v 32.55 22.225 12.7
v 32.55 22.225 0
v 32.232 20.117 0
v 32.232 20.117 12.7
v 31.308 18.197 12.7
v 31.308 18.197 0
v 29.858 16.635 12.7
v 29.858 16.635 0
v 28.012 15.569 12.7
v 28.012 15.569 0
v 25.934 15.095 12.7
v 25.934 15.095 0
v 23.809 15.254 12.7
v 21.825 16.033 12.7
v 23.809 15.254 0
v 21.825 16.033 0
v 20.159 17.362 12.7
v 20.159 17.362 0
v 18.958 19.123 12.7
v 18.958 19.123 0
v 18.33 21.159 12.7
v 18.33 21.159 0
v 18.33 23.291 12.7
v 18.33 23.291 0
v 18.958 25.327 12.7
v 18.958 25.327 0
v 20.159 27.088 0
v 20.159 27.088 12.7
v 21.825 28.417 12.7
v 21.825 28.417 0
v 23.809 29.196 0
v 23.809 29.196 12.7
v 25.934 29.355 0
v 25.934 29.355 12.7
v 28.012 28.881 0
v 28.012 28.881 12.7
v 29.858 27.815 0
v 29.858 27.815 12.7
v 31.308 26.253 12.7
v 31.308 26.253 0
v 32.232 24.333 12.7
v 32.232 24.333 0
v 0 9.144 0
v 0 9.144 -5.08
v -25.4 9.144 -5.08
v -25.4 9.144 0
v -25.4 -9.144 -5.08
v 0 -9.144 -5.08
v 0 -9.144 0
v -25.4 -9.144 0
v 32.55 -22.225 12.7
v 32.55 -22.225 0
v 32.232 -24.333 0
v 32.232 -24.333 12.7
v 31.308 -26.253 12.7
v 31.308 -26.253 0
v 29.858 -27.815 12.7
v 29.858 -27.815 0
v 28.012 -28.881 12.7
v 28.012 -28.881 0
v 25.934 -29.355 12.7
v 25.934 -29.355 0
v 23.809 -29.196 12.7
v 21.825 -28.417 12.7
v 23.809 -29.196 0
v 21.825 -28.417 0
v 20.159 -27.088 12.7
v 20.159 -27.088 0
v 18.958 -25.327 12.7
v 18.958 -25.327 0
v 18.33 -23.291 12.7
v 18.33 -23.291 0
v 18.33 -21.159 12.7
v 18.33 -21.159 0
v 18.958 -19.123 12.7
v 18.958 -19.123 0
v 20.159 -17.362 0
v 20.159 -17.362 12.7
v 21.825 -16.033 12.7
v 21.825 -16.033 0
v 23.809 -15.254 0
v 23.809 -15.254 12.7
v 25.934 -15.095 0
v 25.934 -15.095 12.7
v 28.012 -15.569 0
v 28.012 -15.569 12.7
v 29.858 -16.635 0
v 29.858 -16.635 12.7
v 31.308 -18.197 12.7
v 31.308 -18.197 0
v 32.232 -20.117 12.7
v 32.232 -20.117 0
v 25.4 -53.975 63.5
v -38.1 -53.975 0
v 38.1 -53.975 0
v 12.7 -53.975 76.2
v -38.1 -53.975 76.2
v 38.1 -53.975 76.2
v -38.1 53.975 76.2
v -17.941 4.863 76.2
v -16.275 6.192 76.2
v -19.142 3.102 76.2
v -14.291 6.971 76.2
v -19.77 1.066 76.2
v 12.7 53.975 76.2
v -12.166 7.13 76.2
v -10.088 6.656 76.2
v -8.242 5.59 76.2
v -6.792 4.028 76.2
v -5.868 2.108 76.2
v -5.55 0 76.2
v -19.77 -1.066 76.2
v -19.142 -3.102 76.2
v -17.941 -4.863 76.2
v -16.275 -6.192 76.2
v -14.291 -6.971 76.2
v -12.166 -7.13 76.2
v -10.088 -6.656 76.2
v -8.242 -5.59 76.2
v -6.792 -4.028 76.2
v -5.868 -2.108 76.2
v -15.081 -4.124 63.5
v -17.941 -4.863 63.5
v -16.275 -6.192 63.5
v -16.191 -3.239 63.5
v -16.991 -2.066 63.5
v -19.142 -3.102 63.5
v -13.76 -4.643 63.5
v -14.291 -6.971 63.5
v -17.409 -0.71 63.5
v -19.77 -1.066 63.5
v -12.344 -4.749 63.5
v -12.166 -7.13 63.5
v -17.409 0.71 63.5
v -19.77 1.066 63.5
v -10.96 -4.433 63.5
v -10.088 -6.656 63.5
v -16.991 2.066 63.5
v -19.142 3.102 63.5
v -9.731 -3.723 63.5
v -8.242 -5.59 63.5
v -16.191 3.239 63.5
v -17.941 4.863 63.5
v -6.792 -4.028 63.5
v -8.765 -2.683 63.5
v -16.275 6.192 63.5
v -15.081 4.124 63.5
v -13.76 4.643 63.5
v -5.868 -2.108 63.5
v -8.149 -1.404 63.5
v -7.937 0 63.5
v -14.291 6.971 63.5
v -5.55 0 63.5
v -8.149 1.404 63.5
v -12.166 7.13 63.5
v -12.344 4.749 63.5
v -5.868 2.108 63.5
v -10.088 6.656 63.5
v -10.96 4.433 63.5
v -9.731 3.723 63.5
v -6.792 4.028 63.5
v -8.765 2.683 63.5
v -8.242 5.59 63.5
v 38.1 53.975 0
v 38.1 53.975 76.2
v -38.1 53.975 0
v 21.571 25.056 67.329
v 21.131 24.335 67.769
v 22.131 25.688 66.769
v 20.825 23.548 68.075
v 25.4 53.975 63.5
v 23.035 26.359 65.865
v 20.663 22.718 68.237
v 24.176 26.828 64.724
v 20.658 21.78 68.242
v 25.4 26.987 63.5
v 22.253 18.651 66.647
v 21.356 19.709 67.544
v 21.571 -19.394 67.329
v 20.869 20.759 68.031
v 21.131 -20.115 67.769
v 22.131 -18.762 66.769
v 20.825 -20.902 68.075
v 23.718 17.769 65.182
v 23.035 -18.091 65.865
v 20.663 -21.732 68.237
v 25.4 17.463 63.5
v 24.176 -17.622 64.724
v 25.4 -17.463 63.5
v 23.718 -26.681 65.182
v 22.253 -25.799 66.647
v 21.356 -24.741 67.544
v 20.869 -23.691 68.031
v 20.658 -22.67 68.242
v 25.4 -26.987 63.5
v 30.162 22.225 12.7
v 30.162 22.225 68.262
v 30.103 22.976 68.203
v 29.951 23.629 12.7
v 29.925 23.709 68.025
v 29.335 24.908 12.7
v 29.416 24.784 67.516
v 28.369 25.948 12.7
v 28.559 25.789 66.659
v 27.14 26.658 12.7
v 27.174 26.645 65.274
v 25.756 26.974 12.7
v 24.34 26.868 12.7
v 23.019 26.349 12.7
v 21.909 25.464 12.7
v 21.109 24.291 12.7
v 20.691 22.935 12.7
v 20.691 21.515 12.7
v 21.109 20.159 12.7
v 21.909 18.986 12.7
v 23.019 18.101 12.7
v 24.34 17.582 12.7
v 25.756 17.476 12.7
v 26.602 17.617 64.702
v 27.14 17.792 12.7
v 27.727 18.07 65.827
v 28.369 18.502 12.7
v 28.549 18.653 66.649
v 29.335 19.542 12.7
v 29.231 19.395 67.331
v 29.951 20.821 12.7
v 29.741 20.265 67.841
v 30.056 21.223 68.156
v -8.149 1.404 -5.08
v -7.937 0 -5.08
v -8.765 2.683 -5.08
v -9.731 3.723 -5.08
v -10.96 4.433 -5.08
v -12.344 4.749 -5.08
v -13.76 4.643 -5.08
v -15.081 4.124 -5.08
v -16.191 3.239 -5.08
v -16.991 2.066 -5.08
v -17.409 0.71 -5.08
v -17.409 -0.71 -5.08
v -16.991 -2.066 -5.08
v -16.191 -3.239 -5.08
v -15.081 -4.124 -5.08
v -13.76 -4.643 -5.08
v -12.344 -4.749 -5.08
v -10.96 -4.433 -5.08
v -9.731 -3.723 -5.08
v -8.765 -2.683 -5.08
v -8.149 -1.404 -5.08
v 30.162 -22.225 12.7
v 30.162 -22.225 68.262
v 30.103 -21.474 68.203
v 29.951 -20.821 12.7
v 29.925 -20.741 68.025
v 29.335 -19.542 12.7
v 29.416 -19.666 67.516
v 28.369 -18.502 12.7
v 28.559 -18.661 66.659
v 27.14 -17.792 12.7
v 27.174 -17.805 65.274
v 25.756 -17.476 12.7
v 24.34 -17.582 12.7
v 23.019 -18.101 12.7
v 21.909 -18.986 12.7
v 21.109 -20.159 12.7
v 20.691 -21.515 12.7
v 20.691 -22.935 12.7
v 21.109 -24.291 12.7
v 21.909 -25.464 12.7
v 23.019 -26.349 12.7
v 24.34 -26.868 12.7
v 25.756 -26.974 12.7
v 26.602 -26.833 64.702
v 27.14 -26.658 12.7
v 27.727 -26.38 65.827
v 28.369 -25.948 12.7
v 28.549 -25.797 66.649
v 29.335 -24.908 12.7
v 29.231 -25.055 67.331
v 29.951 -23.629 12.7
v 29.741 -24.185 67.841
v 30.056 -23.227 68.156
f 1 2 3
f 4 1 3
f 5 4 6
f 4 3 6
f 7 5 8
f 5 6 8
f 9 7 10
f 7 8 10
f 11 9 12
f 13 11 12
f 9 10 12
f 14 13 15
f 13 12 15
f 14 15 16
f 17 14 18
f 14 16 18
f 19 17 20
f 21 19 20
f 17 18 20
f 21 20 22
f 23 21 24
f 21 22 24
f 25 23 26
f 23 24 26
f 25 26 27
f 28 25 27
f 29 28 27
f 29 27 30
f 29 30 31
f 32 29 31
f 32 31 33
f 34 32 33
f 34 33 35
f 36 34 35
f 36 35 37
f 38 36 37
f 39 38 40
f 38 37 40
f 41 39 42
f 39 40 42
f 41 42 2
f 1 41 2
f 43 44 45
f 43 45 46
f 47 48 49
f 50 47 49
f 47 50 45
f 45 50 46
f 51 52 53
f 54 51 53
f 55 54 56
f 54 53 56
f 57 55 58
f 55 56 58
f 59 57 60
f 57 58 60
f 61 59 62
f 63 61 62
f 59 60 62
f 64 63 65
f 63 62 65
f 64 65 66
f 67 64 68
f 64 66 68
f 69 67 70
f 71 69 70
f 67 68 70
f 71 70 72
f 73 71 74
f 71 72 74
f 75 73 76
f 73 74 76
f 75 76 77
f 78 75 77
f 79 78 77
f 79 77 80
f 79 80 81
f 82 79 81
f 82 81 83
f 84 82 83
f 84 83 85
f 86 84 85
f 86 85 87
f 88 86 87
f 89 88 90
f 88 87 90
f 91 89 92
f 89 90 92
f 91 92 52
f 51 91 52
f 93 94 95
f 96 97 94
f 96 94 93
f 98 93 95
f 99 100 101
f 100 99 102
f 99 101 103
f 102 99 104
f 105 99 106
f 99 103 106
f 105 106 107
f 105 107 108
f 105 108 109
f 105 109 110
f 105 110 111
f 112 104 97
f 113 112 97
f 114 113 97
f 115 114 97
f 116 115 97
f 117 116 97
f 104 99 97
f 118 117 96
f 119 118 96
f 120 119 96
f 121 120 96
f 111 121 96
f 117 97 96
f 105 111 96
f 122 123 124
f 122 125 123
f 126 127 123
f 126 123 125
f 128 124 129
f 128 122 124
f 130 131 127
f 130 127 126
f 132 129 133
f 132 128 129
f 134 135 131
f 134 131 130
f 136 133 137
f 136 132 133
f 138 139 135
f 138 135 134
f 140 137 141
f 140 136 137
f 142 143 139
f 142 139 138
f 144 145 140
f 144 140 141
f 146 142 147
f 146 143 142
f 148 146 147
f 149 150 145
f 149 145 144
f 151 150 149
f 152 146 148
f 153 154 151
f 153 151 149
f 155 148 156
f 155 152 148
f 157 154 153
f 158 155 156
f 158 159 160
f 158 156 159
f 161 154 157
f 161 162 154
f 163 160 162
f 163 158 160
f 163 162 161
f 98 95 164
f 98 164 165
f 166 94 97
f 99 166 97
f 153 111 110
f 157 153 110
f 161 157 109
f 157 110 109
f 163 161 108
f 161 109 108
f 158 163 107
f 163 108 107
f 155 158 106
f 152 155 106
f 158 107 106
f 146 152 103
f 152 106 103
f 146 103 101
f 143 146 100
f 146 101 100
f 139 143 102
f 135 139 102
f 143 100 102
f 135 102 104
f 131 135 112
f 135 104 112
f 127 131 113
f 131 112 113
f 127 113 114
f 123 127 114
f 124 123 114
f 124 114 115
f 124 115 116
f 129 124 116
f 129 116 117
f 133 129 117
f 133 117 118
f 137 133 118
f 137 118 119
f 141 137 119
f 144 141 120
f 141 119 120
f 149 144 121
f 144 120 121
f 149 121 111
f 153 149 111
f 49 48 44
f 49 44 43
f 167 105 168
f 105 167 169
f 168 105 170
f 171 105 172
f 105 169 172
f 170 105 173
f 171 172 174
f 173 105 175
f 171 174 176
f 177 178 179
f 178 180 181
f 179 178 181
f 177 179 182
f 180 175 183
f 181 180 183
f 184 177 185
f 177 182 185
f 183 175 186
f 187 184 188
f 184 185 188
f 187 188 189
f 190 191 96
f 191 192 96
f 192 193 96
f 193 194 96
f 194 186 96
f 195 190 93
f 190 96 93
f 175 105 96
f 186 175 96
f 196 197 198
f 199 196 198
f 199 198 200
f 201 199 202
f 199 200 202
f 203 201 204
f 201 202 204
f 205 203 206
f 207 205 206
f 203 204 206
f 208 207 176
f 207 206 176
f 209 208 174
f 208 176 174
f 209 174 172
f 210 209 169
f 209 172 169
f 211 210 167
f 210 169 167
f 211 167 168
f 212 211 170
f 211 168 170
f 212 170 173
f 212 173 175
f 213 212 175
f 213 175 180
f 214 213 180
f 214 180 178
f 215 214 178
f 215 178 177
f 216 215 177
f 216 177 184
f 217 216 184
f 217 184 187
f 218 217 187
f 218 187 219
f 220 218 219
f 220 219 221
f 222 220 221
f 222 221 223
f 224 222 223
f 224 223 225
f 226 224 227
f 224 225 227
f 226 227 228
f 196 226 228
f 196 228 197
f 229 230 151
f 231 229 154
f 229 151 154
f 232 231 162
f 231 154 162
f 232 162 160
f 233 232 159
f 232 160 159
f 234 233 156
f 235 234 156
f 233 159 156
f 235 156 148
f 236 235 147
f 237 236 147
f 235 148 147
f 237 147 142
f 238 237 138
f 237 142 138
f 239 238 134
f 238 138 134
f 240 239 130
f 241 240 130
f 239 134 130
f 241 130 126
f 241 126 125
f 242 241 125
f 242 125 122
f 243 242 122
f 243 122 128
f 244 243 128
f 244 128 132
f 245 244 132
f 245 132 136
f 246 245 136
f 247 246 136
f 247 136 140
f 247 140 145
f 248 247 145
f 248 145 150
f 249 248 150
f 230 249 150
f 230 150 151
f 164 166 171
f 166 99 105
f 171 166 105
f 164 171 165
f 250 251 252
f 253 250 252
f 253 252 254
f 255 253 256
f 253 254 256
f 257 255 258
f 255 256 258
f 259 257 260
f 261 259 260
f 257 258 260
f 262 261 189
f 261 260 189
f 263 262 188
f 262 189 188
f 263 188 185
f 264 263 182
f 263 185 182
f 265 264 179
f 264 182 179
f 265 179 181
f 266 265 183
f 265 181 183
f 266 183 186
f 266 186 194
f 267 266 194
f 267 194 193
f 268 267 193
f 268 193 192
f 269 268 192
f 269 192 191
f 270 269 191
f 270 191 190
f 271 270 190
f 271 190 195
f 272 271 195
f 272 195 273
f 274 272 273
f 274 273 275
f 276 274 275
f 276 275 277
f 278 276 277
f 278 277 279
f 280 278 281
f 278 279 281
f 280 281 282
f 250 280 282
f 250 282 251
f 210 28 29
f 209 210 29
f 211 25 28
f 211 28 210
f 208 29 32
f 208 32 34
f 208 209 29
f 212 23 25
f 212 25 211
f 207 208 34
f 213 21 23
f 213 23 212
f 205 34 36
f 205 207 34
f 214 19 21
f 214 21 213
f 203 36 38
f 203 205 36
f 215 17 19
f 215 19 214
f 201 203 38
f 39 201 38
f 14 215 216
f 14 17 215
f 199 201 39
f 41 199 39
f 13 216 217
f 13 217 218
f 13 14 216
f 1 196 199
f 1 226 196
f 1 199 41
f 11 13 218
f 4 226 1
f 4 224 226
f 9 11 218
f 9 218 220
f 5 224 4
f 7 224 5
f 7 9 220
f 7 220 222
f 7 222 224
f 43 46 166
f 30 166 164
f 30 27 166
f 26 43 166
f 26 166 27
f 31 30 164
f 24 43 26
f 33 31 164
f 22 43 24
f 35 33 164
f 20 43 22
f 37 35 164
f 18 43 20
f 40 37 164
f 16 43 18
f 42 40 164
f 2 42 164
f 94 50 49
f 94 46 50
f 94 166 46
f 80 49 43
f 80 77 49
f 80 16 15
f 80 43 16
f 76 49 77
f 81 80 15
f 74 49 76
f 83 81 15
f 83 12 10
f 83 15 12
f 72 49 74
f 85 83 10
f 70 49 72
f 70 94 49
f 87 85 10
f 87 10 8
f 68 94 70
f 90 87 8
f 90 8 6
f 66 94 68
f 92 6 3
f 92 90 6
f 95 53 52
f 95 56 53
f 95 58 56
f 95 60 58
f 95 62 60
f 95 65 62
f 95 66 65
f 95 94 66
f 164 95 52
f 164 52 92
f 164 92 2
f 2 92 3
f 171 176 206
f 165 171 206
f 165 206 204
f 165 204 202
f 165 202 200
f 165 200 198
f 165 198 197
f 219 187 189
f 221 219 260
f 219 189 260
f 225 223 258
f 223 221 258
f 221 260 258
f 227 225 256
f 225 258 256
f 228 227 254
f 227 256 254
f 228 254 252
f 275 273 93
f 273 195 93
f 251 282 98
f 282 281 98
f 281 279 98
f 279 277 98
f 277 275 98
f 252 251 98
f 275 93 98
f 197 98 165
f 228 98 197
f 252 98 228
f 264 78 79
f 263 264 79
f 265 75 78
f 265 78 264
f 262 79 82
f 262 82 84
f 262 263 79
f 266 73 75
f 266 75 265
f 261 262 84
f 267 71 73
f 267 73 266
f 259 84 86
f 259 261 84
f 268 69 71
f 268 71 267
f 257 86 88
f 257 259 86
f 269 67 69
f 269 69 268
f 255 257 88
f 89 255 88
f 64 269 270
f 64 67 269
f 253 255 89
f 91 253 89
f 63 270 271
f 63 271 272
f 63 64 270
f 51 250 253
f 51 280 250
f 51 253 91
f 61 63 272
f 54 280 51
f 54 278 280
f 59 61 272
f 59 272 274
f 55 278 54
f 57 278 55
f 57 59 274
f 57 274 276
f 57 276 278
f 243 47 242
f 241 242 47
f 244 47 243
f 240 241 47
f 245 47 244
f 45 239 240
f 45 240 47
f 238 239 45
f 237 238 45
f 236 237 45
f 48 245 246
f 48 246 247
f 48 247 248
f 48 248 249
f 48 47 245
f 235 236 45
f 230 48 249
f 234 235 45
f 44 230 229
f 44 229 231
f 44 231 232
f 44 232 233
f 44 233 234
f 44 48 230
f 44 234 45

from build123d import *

# Parameters (mm, degrees)
F0_W      = 76.2
F0_H      = 76.2
F1_DEPTH  = 53.975
F3_DEPTH  = 107.951
F5_W      = 18.288
F5_H      = 5.08
F6_DEPTH  = 63.5
F4_R      = 4.7625
F7_DEPTH  = 81.281
F8_R      = 7.1501
F9_DEPTH  = 12.7
F10_R     = 7.1501
F11_DEPTH = 12.7
F12_W     = 38.1
F12_H     = 9
F13_DEPTH = 107.951


with BuildPart() as f1:
    # F0 (on Front) → F1 (new body, symmetric)
    with BuildSketch(Plane.XZ):
        with Locations((0, 38.1)):
            Rectangle(F0_W, F0_H)
    extrude(amount=F1_DEPTH, both=True)

    # F2 (on face) → F3 (cut, through all)
    with BuildSketch(Plane.XZ.offset(53.975)):
        Polygon((38.1, 76.2), (12.7, 76.2), (25.4, 63.5), align=None)
    extrude(amount=-F3_DEPTH, mode=Mode.SUBTRACT)

    # F5 (on face) → F6 (join)
    with BuildSketch(Plane.YZ.offset(38.1)):
        with Locations((0, -2.54)):
            Rectangle(F5_W, F5_H)
    extrude(amount=-F6_DEPTH)

    # F4 (on face) → F7 (cut, through all)
    with BuildSketch(Plane.XY.offset(76.2)):
        with Locations((25.4, 22.225)):
            Circle(F4_R)
        with Locations((25.4, -22.225)):
            Circle(F4_R)
        with Locations((-12.7, 0)):
            Circle(F4_R)
    extrude(amount=-F7_DEPTH, mode=Mode.SUBTRACT)

    # F8 (on face) → F9 (cut)
    with BuildSketch(Plane(origin=(0, 0, 0), x_dir=(1, 0, 0), z_dir=(0, 0, -1))):
        with Locations((25.4, -22.225)):
            Circle(F8_R)
        with Locations((25.4, 22.225)):
            Circle(F8_R)
    extrude(amount=-F9_DEPTH, mode=Mode.SUBTRACT)

    # F10 (on face) → F11 (cut)
    with BuildSketch(Plane.XY.offset(76.2)):
        with Locations((-12.7, 0)):
            Circle(F10_R)
    extrude(amount=-F11_DEPTH, mode=Mode.SUBTRACT)

    # F12 (on face) → F13 (cut, through all)
    with BuildSketch(Plane.XZ.offset(53.975)):
        with Locations((19.05, -4.5)):
            Rectangle(F12_W, F12_H)
    extrude(amount=-F13_DEPTH, mode=Mode.SUBTRACT)


solid = f1.part
